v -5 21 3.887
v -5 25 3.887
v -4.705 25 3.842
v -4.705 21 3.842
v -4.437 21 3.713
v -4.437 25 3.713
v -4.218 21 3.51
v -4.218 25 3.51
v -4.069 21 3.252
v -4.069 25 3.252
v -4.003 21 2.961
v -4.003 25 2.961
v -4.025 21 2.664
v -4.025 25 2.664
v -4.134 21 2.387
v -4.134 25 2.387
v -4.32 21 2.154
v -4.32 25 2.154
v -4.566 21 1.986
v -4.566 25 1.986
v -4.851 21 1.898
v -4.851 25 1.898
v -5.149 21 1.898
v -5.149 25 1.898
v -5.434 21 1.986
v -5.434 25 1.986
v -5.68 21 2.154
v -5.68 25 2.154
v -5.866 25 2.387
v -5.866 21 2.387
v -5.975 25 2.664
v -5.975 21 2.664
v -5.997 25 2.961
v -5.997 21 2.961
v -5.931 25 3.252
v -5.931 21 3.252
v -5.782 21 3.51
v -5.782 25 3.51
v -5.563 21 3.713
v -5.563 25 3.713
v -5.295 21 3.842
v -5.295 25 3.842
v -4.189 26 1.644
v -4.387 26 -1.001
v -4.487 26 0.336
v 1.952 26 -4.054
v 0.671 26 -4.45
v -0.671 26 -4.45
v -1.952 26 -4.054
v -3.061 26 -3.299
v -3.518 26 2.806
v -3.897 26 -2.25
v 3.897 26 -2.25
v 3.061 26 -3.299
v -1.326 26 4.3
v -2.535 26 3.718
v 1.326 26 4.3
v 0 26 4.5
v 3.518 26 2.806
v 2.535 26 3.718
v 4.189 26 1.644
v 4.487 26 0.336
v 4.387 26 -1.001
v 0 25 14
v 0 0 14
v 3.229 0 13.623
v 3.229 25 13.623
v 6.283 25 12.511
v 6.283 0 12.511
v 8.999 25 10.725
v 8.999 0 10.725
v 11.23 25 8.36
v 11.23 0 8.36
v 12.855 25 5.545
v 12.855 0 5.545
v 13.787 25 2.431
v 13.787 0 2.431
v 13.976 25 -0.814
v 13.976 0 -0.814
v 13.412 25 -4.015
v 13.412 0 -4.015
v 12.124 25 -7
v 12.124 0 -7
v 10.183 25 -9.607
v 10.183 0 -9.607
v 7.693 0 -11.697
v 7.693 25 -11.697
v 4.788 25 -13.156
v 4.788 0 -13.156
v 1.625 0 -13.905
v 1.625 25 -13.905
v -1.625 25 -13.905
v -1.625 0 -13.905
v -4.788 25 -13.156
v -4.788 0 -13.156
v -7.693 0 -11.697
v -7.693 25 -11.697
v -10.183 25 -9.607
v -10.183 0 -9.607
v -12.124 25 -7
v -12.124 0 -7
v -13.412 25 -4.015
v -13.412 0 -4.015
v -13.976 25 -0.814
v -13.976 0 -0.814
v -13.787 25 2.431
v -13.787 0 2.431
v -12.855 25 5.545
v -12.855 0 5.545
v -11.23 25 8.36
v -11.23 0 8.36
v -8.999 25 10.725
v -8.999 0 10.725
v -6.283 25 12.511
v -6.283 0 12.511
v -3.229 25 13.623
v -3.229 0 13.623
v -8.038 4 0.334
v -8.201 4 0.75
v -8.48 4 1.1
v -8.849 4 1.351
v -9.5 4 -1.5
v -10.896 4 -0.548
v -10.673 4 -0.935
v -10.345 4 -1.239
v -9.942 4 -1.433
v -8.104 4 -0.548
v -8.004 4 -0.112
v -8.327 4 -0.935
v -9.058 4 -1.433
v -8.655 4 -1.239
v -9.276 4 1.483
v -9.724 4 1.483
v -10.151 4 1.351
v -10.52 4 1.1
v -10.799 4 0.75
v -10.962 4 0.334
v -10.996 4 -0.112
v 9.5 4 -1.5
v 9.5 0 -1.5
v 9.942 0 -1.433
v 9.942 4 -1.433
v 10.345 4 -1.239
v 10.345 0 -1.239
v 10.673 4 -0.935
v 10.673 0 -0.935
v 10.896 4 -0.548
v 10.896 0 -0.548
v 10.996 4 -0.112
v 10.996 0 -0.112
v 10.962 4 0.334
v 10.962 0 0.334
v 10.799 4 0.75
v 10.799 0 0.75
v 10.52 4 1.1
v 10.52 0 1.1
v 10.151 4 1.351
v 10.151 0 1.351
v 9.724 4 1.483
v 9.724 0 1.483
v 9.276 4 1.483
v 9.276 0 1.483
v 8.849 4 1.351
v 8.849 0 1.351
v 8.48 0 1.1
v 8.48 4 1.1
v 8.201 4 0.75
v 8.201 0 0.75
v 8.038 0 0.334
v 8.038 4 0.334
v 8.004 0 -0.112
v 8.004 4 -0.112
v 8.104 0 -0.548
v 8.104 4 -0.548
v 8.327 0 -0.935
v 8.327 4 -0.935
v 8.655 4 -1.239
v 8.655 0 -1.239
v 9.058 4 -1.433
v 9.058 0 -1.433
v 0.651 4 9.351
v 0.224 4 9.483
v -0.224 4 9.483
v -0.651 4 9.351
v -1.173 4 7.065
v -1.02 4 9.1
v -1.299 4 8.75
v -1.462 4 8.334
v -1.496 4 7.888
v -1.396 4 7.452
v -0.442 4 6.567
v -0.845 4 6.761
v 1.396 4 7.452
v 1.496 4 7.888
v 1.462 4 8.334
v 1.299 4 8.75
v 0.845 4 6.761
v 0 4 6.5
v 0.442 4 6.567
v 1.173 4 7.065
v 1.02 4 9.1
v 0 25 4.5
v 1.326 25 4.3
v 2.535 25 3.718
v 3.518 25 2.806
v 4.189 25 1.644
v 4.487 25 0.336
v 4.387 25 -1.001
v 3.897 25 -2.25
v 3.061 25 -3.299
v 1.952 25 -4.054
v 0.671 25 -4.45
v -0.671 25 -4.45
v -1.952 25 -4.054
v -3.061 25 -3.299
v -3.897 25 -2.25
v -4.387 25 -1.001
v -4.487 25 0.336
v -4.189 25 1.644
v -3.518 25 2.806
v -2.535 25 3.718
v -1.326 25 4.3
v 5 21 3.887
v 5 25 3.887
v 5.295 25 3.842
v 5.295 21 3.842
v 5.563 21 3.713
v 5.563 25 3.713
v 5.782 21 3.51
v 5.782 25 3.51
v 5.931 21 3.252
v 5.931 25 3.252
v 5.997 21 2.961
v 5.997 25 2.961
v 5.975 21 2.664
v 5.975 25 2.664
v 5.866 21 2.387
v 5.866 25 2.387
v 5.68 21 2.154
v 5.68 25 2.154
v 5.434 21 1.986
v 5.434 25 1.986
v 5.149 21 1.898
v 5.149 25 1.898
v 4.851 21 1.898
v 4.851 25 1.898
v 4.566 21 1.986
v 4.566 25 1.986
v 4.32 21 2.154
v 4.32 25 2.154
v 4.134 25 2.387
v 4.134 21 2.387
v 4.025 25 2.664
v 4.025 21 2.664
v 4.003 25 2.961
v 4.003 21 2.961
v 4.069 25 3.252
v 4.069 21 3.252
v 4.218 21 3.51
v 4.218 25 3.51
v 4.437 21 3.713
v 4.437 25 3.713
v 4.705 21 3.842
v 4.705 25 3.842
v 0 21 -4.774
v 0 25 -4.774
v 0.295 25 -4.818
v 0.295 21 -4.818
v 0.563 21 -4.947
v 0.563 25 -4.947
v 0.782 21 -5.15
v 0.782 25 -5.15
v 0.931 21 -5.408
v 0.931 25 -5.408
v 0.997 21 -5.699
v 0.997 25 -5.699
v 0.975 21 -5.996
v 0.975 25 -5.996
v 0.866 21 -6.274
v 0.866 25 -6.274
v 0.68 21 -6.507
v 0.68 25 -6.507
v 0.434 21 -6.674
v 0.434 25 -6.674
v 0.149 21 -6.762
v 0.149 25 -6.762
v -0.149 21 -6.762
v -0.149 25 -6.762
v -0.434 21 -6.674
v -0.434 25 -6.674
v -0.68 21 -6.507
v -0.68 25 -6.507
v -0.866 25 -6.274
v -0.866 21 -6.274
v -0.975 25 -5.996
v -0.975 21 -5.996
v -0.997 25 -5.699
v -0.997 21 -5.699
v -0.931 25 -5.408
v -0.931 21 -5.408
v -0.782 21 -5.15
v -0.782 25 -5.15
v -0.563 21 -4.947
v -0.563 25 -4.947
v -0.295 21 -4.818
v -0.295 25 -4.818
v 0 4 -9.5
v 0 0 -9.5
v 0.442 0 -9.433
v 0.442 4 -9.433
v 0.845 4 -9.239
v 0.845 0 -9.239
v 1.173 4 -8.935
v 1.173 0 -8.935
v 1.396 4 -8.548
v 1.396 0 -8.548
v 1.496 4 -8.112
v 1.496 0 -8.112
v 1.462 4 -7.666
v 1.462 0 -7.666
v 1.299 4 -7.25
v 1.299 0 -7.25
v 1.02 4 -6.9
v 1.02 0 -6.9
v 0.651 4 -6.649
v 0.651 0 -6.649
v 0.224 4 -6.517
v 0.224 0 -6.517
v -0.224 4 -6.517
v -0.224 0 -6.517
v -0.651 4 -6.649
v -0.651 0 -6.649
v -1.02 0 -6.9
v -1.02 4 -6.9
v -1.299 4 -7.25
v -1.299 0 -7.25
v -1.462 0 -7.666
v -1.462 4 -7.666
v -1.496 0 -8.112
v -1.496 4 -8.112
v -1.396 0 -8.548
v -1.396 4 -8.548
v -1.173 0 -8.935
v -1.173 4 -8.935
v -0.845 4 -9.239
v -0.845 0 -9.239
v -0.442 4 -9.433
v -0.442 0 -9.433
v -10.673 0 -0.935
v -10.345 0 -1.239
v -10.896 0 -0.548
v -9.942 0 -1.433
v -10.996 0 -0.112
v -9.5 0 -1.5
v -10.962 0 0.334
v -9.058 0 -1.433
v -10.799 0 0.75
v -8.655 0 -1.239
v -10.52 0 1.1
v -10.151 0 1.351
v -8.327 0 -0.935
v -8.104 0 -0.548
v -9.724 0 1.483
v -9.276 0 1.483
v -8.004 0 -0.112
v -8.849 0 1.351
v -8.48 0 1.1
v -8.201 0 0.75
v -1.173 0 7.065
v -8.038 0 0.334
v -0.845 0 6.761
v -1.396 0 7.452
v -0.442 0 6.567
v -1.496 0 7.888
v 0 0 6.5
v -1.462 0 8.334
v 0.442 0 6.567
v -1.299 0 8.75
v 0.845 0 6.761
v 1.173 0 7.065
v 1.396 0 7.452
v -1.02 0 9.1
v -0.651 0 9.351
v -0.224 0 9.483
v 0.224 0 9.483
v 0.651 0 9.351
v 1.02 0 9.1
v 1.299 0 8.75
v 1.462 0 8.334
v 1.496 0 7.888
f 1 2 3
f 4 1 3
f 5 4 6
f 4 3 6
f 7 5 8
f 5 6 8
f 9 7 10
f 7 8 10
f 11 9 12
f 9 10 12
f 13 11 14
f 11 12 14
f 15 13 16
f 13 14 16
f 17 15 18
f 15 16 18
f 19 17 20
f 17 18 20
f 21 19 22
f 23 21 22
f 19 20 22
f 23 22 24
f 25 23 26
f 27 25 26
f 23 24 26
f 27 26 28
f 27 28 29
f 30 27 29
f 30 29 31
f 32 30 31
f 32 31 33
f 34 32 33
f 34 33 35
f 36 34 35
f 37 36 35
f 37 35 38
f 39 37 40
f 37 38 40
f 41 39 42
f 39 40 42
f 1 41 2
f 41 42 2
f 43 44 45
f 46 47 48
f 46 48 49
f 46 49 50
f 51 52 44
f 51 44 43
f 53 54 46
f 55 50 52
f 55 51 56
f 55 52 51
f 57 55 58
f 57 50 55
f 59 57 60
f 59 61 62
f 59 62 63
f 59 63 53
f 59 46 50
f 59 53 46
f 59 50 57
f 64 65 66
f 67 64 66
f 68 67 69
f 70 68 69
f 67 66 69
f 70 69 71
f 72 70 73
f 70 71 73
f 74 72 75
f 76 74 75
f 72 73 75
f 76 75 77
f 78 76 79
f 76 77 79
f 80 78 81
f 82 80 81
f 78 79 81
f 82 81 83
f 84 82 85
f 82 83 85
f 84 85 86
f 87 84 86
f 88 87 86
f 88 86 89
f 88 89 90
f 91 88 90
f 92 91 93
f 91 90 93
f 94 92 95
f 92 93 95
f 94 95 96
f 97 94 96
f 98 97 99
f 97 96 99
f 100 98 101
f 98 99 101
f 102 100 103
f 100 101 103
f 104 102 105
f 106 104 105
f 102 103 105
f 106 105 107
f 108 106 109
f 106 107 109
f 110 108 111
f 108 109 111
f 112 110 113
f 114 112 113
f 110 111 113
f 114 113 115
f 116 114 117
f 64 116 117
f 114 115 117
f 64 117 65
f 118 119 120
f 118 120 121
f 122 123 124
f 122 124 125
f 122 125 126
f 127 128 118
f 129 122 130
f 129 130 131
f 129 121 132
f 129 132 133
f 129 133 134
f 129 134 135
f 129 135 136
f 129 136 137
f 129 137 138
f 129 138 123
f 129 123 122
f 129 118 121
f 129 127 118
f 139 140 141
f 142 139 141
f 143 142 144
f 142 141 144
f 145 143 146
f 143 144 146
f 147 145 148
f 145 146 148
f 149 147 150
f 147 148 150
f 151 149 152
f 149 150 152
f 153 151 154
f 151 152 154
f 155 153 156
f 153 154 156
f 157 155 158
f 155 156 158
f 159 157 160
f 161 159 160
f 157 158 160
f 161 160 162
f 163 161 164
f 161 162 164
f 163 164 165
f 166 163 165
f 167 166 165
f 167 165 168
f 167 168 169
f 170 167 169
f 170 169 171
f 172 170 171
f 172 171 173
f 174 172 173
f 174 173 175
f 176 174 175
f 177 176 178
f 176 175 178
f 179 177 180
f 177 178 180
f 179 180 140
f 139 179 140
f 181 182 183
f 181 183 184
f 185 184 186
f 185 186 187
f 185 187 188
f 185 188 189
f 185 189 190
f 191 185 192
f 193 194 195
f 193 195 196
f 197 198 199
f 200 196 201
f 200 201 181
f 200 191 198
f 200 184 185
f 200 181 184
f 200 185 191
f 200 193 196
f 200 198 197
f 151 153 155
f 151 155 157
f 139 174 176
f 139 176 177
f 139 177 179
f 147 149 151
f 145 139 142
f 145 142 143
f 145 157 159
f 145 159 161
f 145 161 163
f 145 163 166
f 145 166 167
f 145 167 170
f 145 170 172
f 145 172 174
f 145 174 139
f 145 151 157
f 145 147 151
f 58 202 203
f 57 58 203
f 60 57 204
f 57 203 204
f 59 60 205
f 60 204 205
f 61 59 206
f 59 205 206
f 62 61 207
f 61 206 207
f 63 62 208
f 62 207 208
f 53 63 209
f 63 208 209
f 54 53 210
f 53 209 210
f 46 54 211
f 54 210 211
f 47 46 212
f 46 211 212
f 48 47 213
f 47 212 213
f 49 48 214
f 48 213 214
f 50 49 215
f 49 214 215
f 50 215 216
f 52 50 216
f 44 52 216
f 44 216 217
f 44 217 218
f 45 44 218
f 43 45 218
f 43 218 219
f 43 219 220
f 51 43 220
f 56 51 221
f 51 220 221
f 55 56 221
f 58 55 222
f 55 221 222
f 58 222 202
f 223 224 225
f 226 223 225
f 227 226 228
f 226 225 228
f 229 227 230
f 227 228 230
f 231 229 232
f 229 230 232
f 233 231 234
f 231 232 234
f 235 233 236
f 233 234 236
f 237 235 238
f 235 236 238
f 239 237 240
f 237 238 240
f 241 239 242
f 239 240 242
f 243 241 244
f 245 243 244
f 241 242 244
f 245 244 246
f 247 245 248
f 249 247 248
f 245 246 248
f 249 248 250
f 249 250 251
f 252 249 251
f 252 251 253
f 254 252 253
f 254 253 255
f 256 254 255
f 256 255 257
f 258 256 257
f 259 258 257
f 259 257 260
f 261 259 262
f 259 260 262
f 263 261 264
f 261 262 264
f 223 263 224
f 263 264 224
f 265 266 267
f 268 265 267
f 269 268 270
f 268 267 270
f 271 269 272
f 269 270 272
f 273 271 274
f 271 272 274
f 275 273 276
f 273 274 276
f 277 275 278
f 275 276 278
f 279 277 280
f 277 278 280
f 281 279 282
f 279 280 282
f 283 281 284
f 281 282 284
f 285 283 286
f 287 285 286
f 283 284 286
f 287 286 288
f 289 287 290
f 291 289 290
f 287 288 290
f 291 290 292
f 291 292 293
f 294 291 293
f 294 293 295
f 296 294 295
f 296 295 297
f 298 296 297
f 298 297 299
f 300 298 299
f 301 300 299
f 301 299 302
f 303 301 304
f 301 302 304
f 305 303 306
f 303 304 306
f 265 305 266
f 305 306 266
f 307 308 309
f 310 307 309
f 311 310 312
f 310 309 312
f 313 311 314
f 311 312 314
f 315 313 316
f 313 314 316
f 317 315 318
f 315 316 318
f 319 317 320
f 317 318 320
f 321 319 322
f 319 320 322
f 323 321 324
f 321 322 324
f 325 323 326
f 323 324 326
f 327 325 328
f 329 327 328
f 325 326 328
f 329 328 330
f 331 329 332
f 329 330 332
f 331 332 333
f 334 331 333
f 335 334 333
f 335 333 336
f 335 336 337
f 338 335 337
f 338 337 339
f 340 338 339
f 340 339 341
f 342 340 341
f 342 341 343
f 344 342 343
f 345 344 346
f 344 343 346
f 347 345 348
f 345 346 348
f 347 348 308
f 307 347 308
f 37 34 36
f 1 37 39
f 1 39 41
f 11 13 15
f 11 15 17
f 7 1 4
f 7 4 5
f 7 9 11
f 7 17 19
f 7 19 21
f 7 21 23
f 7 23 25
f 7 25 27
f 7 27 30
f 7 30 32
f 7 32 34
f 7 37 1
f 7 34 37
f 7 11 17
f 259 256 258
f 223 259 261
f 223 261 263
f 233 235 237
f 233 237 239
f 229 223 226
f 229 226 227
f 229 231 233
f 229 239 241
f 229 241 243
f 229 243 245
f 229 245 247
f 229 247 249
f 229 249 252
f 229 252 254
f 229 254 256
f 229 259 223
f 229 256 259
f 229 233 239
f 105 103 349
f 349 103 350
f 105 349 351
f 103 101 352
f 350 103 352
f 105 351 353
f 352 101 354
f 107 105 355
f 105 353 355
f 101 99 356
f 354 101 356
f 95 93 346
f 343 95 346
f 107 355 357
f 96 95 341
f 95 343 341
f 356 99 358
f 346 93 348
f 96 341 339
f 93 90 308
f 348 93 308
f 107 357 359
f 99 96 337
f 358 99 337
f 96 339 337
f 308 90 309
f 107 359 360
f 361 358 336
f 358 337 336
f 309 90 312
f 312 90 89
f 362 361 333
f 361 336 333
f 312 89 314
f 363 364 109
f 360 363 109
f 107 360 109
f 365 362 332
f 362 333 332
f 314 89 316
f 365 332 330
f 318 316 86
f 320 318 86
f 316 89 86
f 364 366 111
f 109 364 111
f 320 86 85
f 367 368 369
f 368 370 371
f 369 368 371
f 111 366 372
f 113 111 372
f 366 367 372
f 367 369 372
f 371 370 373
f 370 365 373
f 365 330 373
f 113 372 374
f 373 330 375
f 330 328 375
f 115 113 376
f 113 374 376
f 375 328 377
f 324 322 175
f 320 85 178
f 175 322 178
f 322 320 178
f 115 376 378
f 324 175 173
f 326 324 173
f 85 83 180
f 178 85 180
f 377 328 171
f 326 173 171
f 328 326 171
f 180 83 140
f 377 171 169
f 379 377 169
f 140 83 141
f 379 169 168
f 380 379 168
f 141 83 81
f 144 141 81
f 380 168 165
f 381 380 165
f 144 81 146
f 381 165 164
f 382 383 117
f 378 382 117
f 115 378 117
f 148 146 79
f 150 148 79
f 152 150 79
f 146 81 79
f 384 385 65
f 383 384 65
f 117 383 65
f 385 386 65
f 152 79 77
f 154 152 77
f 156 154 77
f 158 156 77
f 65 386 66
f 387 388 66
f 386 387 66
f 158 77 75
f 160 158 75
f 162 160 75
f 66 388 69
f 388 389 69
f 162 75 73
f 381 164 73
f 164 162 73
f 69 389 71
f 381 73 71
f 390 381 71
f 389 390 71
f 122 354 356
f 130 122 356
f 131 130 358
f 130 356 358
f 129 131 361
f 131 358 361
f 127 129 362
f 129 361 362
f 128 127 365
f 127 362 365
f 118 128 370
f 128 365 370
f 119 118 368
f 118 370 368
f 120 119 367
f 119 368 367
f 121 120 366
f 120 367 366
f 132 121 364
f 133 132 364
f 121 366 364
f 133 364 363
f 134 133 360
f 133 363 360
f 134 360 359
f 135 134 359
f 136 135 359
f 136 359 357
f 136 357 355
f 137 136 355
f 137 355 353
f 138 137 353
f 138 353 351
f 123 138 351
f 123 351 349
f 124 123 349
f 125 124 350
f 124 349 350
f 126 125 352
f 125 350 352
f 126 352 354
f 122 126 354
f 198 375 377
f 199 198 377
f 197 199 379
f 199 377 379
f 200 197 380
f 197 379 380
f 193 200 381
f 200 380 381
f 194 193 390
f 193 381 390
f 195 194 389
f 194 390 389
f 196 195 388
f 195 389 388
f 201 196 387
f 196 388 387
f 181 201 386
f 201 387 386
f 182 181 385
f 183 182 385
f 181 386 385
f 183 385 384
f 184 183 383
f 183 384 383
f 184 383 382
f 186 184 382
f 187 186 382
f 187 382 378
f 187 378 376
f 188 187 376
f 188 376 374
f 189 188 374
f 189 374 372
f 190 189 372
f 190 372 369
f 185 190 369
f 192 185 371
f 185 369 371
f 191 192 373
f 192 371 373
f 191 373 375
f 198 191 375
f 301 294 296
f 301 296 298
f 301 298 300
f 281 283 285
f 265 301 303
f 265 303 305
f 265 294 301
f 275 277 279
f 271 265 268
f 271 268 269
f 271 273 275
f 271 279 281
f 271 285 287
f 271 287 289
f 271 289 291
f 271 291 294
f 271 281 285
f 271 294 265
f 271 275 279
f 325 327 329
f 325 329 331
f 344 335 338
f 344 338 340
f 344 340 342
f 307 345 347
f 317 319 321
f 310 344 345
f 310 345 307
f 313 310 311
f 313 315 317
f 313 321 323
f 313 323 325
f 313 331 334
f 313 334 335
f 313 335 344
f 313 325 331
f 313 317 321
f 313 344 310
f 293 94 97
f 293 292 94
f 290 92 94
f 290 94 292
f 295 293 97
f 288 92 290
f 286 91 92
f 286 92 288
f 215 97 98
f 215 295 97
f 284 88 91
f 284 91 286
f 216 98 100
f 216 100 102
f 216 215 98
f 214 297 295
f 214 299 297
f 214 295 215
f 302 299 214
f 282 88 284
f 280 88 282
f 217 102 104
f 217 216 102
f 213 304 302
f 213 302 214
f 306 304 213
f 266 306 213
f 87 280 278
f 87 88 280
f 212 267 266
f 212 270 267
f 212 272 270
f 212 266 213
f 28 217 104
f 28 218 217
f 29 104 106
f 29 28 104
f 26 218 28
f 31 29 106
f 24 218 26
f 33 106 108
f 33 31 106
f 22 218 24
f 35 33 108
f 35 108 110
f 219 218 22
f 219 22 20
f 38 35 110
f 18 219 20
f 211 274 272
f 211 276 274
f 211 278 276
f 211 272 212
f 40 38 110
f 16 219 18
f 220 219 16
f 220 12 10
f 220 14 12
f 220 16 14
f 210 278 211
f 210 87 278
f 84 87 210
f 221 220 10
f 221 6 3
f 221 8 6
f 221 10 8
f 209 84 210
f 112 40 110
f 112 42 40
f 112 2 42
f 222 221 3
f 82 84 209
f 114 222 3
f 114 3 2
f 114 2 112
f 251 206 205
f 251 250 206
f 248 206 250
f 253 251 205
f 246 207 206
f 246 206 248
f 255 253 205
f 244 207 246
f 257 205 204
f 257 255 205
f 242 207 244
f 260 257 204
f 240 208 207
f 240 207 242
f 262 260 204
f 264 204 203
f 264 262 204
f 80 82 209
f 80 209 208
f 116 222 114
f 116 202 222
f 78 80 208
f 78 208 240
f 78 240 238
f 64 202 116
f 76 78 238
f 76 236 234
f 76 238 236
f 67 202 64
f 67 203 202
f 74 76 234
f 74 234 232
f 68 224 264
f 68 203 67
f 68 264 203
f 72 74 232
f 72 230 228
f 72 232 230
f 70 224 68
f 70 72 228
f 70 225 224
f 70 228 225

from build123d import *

# Parameters (mm, degrees)
SKETCH1_R           = 14
BOSS_EXTRUDE1_DEPTH = 25
SKETCH3_R           = 4.5
BOSS_EXTRUDE2_DEPTH = 1
SKETCH4_R           = 1
CUT_EXTRUDE1_DEPTH  = 4
SKETCH5_R           = 1.5
CUT_EXTRUDE2_DEPTH  = 4


with BuildPart() as part:
    # Sketch1 → Boss-Extrude1 (new body)
    with BuildSketch(Plane(origin=(0, 0, 0), x_dir=(1, 0, 0), z_dir=(0, 1, 0))):
        Circle(SKETCH1_R)
    extrude(amount=BOSS_EXTRUDE1_DEPTH)

    # Sketch3 → Boss-Extrude2 (add)
    with BuildSketch(Plane(origin=(0, 25, 0), x_dir=(1, 0, 0), z_dir=(0, 1, 0))):
        Circle(SKETCH3_R)
    extrude(amount=BOSS_EXTRUDE2_DEPTH)

    # Sketch4 → Cut-Extrude1 (cut)
    with BuildSketch(Plane(origin=(0, 25, 0), x_dir=(1, 0, 0), z_dir=(0, 1, 0))):
        with Locations((0, 5.773502692)):
            Circle(SKETCH4_R)
        with Locations((5, -2.886751346)):
            Circle(SKETCH4_R)
        with Locations((-5, -2.886751346)):
            Circle(SKETCH4_R)
    extrude(amount=-CUT_EXTRUDE1_DEPTH, mode=Mode.SUBTRACT)

    # Sketch5 → Cut-Extrude2 (cut)
    with BuildSketch(Plane.XZ):
        with Locations((9.5, 0)):
            Circle(SKETCH5_R)
        with Locations((-9.5, 0)):
            Circle(SKETCH5_R)
        with Locations((0, -8)):
            Circle(SKETCH5_R)
        with Locations((0, 8)):
            Circle(SKETCH5_R)
    extrude(amount=-CUT_EXTRUDE2_DEPTH, mode=Mode.SUBTRACT)


solid = part.part
